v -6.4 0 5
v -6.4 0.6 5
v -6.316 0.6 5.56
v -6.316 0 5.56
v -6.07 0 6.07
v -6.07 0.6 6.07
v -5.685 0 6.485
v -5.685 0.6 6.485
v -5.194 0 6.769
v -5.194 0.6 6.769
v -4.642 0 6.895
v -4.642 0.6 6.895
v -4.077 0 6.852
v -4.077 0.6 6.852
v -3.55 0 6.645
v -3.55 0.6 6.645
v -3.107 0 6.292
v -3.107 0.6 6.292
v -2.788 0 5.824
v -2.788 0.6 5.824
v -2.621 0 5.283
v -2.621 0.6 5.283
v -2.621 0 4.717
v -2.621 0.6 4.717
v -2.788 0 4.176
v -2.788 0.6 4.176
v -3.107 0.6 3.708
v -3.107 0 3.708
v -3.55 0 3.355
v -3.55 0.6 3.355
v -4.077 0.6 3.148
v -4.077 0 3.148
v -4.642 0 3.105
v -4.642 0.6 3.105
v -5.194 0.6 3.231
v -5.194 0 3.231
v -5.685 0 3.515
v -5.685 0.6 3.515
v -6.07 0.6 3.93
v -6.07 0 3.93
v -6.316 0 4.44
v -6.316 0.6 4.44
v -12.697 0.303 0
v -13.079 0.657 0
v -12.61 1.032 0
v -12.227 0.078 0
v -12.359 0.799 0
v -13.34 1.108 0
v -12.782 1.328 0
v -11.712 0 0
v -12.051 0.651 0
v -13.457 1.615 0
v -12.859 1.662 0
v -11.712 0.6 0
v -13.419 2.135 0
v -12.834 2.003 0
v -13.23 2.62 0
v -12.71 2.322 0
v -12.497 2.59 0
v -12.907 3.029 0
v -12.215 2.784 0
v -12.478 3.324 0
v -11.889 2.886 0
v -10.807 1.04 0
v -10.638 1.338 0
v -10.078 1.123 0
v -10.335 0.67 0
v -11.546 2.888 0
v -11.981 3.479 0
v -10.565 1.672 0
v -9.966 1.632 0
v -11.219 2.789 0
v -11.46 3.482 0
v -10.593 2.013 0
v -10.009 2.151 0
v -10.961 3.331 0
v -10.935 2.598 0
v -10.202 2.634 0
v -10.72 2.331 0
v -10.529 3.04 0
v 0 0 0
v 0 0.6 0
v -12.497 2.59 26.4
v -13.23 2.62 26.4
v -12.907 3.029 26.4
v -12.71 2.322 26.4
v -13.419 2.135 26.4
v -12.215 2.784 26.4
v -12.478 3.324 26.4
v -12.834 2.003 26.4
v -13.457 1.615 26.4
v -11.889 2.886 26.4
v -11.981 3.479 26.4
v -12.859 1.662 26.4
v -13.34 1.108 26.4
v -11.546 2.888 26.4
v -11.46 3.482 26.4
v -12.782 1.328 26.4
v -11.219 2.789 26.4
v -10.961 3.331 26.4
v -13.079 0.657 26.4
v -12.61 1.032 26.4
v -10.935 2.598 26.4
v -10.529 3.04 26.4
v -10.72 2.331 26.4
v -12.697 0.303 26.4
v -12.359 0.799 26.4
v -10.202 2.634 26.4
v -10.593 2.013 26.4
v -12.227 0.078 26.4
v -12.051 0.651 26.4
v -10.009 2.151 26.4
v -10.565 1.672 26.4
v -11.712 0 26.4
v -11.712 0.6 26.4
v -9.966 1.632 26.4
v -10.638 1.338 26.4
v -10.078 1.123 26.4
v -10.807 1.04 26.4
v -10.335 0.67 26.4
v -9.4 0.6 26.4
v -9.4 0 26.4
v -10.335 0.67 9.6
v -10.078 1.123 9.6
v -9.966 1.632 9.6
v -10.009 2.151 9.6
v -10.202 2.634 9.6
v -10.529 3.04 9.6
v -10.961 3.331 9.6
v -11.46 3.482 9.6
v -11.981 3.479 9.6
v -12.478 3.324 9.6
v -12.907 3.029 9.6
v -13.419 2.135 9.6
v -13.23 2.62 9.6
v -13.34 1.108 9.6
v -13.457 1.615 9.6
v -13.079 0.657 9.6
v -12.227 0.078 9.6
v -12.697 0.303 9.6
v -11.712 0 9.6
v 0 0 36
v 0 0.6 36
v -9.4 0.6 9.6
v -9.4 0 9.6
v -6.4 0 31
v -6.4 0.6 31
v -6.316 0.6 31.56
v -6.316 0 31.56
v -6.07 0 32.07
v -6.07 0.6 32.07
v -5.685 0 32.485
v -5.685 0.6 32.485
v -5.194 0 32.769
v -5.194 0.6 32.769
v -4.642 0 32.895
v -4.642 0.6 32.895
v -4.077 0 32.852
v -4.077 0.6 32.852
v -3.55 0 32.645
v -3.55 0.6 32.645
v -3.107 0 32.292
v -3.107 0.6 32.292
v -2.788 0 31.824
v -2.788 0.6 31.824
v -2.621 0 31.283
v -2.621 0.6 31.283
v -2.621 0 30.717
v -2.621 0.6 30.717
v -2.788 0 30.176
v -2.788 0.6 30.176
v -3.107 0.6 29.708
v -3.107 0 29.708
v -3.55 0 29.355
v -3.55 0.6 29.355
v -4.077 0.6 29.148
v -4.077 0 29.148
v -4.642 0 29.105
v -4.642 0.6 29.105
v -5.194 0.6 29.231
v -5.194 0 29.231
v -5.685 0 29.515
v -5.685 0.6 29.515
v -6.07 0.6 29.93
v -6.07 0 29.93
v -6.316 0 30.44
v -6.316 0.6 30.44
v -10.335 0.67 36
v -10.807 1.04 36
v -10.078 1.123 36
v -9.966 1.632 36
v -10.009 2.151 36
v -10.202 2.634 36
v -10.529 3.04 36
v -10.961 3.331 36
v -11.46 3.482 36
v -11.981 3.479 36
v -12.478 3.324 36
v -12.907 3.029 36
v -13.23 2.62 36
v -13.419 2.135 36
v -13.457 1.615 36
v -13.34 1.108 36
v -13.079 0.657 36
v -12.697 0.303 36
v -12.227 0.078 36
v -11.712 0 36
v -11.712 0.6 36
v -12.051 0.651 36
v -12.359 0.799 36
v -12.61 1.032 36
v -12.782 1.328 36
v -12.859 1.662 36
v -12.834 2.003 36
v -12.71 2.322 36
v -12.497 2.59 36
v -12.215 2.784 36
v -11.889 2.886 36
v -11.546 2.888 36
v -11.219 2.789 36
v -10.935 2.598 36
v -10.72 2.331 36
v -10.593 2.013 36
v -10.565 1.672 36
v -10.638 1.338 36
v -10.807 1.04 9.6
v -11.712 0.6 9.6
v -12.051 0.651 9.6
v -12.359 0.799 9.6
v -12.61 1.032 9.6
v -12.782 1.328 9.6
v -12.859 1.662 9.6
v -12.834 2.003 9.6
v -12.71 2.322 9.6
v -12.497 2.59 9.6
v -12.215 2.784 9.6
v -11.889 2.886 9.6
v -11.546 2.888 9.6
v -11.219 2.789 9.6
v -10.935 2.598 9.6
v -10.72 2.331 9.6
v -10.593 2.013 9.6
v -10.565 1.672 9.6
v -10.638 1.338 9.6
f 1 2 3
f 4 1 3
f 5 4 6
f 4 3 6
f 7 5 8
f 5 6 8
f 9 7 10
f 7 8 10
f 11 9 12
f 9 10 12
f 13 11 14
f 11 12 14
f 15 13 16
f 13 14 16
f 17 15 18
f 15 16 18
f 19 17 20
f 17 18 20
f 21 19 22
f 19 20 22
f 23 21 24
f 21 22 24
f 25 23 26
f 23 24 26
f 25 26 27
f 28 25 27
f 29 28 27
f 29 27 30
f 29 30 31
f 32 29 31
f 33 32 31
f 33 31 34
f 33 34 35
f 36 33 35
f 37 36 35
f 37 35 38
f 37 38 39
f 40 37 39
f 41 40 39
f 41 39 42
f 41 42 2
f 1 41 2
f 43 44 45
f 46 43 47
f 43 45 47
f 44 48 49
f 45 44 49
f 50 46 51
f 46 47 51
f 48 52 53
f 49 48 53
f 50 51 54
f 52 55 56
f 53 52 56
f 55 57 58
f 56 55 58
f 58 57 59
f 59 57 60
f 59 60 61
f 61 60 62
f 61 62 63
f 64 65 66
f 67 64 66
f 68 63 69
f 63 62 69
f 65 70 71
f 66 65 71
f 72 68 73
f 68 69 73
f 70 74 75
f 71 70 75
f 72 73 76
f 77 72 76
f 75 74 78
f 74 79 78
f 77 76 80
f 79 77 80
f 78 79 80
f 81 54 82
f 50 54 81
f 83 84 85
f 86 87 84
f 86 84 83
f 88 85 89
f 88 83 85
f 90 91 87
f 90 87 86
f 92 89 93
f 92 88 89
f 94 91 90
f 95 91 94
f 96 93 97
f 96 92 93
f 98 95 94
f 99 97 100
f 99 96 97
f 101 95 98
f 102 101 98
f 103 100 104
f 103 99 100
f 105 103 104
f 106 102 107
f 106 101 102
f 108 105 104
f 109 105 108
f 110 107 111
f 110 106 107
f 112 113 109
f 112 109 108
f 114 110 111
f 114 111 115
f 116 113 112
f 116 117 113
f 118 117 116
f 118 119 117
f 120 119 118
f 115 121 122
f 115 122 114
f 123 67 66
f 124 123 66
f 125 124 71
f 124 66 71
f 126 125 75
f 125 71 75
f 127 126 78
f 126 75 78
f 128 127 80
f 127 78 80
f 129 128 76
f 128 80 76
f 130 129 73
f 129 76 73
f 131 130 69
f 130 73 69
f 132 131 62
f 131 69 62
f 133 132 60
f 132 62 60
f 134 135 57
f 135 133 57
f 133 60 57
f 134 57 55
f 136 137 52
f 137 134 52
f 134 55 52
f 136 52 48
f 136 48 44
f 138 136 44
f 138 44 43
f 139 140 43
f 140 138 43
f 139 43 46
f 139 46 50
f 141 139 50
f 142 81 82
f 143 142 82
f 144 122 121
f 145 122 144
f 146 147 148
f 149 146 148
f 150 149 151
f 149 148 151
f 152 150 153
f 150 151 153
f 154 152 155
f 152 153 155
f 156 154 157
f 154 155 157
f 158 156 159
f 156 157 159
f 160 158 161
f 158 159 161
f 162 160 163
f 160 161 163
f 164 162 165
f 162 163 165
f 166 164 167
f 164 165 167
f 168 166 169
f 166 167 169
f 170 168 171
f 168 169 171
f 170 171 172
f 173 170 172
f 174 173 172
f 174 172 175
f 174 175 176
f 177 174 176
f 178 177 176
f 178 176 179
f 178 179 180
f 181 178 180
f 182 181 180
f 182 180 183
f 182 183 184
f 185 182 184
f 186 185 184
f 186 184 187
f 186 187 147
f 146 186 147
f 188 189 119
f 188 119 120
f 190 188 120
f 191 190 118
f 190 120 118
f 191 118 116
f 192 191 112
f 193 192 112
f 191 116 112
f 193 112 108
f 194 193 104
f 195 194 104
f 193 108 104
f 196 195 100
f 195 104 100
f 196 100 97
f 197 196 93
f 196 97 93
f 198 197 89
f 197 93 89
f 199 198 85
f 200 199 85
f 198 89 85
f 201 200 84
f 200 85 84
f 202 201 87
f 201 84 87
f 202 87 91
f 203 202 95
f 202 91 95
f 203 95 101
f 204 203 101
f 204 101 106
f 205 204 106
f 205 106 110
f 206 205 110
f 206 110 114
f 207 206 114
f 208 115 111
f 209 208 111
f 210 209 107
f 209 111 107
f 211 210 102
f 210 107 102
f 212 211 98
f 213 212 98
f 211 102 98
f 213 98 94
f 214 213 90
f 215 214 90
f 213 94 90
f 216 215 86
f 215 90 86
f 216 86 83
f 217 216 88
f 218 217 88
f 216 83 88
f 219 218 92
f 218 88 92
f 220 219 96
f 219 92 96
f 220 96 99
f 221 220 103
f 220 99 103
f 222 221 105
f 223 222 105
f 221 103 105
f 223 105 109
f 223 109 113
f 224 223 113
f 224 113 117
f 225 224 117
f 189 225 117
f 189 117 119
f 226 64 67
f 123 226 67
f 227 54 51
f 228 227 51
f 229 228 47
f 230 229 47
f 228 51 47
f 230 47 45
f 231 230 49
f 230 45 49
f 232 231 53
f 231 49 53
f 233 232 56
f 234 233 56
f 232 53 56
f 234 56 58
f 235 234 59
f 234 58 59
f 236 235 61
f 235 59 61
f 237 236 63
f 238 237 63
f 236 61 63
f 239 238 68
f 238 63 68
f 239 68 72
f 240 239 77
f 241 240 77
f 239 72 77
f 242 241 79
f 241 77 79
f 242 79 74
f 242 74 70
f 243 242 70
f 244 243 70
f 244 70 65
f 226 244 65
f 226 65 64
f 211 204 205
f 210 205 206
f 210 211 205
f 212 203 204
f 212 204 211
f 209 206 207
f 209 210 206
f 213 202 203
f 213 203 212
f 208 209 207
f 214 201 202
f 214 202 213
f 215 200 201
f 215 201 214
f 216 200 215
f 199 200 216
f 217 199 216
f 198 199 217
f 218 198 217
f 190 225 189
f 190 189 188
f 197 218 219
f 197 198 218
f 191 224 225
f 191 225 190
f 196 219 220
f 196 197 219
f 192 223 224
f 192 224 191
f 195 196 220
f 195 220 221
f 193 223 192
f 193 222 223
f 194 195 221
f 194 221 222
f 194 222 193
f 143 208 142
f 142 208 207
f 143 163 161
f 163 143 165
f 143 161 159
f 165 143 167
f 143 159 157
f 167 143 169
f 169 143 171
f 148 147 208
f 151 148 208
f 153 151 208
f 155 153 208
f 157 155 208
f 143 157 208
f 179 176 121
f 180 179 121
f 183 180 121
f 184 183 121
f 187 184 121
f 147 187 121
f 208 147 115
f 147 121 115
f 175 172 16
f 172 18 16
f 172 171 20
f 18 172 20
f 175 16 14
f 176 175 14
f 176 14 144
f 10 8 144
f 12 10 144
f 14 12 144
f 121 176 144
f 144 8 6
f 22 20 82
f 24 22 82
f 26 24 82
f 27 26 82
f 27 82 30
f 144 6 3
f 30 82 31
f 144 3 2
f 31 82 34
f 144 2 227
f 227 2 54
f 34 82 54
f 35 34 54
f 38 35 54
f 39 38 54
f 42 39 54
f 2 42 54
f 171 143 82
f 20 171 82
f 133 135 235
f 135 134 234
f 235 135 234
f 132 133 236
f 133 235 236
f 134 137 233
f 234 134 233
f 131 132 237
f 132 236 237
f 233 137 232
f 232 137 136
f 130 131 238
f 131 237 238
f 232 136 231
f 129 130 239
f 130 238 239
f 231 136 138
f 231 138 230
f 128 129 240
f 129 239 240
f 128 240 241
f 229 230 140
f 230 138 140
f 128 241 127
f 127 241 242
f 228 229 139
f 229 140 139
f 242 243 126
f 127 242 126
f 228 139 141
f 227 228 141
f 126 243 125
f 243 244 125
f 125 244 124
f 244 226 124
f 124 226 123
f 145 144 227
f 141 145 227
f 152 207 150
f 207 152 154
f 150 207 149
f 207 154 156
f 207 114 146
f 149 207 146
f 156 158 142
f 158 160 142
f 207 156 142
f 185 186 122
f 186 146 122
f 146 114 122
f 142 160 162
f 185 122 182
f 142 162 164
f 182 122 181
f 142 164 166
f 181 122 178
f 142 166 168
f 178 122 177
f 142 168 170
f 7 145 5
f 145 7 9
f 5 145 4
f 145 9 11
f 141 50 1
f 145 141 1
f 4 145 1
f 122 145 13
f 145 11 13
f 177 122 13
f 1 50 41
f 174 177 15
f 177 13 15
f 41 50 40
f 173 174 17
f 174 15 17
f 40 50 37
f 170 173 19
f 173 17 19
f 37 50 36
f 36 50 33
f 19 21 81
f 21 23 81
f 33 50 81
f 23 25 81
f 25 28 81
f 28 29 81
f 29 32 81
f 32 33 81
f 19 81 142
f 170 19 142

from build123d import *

# Parameters (mm, degrees)
BOSS_EXTRUDE1_DEPTH     = 36
SKETCH2_R               = 1.9
CUT_EXTRUDE1_DEPTH      = 39.543989963
CUT_EXTRUDE2_DEPTH      = 39.543989963
CUT_EXTRUDE2_DEPTH_BACK = 39.543989963
SKETCH3_W               = 8.124276203
SKETCH3_H               = 16.8


with BuildPart() as part:
    # Sketch1 → Boss-Extrude1 (new body)
    with BuildSketch(Plane.XY):
        with BuildLine():
            Line((0, 0), (0, 0.6))
            Line((0, 0.6), (-11.712138102, 0.6))
            ThreePointArc((-11.712138102, 0.6), (-12.215259426, 2.784102961), (-10.807304622, 1.040227943))
            Line((-10.807304622, 1.040227943), (-10.335217589, 0.669912086))
            ThreePointArc((-10.335217589, 0.669912086), (-12.477757508, 3.32363494), (-11.712138102, 0))
            Line((-11.712138102, 0), (0, 0))
        make_face()
    extrude(amount=BOSS_EXTRUDE1_DEPTH)

    # Sketch2 → Cut-Extrude1 (cut, through all)
    with BuildSketch(Plane(origin=(0, 0.6, 0), x_dir=(1, 0, 0), z_dir=(0, 1, 0))):
        with Locations(Location((-4.5, -5, 0), (0, 0, 180))):
            Circle(SKETCH2_R)
        with Locations(Location((-4.5, -31, 0), (0, 0, 180))):
            Circle(SKETCH2_R)
    extrude(amount=-CUT_EXTRUDE1_DEPTH, mode=Mode.SUBTRACT)

    # Sketch3 → Cut-Extrude2 (cut, two sides: drawn at the far end of the back side and taken through both)
    with BuildSketch(Plane(origin=(0, 0.6, 0), x_dir=(1, 0, 0), z_dir=(0, 1, 0)).offset(-CUT_EXTRUDE2_DEPTH_BACK)):
        with Locations((-13.462138101, -18)):
            Rectangle(SKETCH3_W, SKETCH3_H)
    extrude(amount=CUT_EXTRUDE2_DEPTH + CUT_EXTRUDE2_DEPTH_BACK, mode=Mode.SUBTRACT)


solid = part.part
